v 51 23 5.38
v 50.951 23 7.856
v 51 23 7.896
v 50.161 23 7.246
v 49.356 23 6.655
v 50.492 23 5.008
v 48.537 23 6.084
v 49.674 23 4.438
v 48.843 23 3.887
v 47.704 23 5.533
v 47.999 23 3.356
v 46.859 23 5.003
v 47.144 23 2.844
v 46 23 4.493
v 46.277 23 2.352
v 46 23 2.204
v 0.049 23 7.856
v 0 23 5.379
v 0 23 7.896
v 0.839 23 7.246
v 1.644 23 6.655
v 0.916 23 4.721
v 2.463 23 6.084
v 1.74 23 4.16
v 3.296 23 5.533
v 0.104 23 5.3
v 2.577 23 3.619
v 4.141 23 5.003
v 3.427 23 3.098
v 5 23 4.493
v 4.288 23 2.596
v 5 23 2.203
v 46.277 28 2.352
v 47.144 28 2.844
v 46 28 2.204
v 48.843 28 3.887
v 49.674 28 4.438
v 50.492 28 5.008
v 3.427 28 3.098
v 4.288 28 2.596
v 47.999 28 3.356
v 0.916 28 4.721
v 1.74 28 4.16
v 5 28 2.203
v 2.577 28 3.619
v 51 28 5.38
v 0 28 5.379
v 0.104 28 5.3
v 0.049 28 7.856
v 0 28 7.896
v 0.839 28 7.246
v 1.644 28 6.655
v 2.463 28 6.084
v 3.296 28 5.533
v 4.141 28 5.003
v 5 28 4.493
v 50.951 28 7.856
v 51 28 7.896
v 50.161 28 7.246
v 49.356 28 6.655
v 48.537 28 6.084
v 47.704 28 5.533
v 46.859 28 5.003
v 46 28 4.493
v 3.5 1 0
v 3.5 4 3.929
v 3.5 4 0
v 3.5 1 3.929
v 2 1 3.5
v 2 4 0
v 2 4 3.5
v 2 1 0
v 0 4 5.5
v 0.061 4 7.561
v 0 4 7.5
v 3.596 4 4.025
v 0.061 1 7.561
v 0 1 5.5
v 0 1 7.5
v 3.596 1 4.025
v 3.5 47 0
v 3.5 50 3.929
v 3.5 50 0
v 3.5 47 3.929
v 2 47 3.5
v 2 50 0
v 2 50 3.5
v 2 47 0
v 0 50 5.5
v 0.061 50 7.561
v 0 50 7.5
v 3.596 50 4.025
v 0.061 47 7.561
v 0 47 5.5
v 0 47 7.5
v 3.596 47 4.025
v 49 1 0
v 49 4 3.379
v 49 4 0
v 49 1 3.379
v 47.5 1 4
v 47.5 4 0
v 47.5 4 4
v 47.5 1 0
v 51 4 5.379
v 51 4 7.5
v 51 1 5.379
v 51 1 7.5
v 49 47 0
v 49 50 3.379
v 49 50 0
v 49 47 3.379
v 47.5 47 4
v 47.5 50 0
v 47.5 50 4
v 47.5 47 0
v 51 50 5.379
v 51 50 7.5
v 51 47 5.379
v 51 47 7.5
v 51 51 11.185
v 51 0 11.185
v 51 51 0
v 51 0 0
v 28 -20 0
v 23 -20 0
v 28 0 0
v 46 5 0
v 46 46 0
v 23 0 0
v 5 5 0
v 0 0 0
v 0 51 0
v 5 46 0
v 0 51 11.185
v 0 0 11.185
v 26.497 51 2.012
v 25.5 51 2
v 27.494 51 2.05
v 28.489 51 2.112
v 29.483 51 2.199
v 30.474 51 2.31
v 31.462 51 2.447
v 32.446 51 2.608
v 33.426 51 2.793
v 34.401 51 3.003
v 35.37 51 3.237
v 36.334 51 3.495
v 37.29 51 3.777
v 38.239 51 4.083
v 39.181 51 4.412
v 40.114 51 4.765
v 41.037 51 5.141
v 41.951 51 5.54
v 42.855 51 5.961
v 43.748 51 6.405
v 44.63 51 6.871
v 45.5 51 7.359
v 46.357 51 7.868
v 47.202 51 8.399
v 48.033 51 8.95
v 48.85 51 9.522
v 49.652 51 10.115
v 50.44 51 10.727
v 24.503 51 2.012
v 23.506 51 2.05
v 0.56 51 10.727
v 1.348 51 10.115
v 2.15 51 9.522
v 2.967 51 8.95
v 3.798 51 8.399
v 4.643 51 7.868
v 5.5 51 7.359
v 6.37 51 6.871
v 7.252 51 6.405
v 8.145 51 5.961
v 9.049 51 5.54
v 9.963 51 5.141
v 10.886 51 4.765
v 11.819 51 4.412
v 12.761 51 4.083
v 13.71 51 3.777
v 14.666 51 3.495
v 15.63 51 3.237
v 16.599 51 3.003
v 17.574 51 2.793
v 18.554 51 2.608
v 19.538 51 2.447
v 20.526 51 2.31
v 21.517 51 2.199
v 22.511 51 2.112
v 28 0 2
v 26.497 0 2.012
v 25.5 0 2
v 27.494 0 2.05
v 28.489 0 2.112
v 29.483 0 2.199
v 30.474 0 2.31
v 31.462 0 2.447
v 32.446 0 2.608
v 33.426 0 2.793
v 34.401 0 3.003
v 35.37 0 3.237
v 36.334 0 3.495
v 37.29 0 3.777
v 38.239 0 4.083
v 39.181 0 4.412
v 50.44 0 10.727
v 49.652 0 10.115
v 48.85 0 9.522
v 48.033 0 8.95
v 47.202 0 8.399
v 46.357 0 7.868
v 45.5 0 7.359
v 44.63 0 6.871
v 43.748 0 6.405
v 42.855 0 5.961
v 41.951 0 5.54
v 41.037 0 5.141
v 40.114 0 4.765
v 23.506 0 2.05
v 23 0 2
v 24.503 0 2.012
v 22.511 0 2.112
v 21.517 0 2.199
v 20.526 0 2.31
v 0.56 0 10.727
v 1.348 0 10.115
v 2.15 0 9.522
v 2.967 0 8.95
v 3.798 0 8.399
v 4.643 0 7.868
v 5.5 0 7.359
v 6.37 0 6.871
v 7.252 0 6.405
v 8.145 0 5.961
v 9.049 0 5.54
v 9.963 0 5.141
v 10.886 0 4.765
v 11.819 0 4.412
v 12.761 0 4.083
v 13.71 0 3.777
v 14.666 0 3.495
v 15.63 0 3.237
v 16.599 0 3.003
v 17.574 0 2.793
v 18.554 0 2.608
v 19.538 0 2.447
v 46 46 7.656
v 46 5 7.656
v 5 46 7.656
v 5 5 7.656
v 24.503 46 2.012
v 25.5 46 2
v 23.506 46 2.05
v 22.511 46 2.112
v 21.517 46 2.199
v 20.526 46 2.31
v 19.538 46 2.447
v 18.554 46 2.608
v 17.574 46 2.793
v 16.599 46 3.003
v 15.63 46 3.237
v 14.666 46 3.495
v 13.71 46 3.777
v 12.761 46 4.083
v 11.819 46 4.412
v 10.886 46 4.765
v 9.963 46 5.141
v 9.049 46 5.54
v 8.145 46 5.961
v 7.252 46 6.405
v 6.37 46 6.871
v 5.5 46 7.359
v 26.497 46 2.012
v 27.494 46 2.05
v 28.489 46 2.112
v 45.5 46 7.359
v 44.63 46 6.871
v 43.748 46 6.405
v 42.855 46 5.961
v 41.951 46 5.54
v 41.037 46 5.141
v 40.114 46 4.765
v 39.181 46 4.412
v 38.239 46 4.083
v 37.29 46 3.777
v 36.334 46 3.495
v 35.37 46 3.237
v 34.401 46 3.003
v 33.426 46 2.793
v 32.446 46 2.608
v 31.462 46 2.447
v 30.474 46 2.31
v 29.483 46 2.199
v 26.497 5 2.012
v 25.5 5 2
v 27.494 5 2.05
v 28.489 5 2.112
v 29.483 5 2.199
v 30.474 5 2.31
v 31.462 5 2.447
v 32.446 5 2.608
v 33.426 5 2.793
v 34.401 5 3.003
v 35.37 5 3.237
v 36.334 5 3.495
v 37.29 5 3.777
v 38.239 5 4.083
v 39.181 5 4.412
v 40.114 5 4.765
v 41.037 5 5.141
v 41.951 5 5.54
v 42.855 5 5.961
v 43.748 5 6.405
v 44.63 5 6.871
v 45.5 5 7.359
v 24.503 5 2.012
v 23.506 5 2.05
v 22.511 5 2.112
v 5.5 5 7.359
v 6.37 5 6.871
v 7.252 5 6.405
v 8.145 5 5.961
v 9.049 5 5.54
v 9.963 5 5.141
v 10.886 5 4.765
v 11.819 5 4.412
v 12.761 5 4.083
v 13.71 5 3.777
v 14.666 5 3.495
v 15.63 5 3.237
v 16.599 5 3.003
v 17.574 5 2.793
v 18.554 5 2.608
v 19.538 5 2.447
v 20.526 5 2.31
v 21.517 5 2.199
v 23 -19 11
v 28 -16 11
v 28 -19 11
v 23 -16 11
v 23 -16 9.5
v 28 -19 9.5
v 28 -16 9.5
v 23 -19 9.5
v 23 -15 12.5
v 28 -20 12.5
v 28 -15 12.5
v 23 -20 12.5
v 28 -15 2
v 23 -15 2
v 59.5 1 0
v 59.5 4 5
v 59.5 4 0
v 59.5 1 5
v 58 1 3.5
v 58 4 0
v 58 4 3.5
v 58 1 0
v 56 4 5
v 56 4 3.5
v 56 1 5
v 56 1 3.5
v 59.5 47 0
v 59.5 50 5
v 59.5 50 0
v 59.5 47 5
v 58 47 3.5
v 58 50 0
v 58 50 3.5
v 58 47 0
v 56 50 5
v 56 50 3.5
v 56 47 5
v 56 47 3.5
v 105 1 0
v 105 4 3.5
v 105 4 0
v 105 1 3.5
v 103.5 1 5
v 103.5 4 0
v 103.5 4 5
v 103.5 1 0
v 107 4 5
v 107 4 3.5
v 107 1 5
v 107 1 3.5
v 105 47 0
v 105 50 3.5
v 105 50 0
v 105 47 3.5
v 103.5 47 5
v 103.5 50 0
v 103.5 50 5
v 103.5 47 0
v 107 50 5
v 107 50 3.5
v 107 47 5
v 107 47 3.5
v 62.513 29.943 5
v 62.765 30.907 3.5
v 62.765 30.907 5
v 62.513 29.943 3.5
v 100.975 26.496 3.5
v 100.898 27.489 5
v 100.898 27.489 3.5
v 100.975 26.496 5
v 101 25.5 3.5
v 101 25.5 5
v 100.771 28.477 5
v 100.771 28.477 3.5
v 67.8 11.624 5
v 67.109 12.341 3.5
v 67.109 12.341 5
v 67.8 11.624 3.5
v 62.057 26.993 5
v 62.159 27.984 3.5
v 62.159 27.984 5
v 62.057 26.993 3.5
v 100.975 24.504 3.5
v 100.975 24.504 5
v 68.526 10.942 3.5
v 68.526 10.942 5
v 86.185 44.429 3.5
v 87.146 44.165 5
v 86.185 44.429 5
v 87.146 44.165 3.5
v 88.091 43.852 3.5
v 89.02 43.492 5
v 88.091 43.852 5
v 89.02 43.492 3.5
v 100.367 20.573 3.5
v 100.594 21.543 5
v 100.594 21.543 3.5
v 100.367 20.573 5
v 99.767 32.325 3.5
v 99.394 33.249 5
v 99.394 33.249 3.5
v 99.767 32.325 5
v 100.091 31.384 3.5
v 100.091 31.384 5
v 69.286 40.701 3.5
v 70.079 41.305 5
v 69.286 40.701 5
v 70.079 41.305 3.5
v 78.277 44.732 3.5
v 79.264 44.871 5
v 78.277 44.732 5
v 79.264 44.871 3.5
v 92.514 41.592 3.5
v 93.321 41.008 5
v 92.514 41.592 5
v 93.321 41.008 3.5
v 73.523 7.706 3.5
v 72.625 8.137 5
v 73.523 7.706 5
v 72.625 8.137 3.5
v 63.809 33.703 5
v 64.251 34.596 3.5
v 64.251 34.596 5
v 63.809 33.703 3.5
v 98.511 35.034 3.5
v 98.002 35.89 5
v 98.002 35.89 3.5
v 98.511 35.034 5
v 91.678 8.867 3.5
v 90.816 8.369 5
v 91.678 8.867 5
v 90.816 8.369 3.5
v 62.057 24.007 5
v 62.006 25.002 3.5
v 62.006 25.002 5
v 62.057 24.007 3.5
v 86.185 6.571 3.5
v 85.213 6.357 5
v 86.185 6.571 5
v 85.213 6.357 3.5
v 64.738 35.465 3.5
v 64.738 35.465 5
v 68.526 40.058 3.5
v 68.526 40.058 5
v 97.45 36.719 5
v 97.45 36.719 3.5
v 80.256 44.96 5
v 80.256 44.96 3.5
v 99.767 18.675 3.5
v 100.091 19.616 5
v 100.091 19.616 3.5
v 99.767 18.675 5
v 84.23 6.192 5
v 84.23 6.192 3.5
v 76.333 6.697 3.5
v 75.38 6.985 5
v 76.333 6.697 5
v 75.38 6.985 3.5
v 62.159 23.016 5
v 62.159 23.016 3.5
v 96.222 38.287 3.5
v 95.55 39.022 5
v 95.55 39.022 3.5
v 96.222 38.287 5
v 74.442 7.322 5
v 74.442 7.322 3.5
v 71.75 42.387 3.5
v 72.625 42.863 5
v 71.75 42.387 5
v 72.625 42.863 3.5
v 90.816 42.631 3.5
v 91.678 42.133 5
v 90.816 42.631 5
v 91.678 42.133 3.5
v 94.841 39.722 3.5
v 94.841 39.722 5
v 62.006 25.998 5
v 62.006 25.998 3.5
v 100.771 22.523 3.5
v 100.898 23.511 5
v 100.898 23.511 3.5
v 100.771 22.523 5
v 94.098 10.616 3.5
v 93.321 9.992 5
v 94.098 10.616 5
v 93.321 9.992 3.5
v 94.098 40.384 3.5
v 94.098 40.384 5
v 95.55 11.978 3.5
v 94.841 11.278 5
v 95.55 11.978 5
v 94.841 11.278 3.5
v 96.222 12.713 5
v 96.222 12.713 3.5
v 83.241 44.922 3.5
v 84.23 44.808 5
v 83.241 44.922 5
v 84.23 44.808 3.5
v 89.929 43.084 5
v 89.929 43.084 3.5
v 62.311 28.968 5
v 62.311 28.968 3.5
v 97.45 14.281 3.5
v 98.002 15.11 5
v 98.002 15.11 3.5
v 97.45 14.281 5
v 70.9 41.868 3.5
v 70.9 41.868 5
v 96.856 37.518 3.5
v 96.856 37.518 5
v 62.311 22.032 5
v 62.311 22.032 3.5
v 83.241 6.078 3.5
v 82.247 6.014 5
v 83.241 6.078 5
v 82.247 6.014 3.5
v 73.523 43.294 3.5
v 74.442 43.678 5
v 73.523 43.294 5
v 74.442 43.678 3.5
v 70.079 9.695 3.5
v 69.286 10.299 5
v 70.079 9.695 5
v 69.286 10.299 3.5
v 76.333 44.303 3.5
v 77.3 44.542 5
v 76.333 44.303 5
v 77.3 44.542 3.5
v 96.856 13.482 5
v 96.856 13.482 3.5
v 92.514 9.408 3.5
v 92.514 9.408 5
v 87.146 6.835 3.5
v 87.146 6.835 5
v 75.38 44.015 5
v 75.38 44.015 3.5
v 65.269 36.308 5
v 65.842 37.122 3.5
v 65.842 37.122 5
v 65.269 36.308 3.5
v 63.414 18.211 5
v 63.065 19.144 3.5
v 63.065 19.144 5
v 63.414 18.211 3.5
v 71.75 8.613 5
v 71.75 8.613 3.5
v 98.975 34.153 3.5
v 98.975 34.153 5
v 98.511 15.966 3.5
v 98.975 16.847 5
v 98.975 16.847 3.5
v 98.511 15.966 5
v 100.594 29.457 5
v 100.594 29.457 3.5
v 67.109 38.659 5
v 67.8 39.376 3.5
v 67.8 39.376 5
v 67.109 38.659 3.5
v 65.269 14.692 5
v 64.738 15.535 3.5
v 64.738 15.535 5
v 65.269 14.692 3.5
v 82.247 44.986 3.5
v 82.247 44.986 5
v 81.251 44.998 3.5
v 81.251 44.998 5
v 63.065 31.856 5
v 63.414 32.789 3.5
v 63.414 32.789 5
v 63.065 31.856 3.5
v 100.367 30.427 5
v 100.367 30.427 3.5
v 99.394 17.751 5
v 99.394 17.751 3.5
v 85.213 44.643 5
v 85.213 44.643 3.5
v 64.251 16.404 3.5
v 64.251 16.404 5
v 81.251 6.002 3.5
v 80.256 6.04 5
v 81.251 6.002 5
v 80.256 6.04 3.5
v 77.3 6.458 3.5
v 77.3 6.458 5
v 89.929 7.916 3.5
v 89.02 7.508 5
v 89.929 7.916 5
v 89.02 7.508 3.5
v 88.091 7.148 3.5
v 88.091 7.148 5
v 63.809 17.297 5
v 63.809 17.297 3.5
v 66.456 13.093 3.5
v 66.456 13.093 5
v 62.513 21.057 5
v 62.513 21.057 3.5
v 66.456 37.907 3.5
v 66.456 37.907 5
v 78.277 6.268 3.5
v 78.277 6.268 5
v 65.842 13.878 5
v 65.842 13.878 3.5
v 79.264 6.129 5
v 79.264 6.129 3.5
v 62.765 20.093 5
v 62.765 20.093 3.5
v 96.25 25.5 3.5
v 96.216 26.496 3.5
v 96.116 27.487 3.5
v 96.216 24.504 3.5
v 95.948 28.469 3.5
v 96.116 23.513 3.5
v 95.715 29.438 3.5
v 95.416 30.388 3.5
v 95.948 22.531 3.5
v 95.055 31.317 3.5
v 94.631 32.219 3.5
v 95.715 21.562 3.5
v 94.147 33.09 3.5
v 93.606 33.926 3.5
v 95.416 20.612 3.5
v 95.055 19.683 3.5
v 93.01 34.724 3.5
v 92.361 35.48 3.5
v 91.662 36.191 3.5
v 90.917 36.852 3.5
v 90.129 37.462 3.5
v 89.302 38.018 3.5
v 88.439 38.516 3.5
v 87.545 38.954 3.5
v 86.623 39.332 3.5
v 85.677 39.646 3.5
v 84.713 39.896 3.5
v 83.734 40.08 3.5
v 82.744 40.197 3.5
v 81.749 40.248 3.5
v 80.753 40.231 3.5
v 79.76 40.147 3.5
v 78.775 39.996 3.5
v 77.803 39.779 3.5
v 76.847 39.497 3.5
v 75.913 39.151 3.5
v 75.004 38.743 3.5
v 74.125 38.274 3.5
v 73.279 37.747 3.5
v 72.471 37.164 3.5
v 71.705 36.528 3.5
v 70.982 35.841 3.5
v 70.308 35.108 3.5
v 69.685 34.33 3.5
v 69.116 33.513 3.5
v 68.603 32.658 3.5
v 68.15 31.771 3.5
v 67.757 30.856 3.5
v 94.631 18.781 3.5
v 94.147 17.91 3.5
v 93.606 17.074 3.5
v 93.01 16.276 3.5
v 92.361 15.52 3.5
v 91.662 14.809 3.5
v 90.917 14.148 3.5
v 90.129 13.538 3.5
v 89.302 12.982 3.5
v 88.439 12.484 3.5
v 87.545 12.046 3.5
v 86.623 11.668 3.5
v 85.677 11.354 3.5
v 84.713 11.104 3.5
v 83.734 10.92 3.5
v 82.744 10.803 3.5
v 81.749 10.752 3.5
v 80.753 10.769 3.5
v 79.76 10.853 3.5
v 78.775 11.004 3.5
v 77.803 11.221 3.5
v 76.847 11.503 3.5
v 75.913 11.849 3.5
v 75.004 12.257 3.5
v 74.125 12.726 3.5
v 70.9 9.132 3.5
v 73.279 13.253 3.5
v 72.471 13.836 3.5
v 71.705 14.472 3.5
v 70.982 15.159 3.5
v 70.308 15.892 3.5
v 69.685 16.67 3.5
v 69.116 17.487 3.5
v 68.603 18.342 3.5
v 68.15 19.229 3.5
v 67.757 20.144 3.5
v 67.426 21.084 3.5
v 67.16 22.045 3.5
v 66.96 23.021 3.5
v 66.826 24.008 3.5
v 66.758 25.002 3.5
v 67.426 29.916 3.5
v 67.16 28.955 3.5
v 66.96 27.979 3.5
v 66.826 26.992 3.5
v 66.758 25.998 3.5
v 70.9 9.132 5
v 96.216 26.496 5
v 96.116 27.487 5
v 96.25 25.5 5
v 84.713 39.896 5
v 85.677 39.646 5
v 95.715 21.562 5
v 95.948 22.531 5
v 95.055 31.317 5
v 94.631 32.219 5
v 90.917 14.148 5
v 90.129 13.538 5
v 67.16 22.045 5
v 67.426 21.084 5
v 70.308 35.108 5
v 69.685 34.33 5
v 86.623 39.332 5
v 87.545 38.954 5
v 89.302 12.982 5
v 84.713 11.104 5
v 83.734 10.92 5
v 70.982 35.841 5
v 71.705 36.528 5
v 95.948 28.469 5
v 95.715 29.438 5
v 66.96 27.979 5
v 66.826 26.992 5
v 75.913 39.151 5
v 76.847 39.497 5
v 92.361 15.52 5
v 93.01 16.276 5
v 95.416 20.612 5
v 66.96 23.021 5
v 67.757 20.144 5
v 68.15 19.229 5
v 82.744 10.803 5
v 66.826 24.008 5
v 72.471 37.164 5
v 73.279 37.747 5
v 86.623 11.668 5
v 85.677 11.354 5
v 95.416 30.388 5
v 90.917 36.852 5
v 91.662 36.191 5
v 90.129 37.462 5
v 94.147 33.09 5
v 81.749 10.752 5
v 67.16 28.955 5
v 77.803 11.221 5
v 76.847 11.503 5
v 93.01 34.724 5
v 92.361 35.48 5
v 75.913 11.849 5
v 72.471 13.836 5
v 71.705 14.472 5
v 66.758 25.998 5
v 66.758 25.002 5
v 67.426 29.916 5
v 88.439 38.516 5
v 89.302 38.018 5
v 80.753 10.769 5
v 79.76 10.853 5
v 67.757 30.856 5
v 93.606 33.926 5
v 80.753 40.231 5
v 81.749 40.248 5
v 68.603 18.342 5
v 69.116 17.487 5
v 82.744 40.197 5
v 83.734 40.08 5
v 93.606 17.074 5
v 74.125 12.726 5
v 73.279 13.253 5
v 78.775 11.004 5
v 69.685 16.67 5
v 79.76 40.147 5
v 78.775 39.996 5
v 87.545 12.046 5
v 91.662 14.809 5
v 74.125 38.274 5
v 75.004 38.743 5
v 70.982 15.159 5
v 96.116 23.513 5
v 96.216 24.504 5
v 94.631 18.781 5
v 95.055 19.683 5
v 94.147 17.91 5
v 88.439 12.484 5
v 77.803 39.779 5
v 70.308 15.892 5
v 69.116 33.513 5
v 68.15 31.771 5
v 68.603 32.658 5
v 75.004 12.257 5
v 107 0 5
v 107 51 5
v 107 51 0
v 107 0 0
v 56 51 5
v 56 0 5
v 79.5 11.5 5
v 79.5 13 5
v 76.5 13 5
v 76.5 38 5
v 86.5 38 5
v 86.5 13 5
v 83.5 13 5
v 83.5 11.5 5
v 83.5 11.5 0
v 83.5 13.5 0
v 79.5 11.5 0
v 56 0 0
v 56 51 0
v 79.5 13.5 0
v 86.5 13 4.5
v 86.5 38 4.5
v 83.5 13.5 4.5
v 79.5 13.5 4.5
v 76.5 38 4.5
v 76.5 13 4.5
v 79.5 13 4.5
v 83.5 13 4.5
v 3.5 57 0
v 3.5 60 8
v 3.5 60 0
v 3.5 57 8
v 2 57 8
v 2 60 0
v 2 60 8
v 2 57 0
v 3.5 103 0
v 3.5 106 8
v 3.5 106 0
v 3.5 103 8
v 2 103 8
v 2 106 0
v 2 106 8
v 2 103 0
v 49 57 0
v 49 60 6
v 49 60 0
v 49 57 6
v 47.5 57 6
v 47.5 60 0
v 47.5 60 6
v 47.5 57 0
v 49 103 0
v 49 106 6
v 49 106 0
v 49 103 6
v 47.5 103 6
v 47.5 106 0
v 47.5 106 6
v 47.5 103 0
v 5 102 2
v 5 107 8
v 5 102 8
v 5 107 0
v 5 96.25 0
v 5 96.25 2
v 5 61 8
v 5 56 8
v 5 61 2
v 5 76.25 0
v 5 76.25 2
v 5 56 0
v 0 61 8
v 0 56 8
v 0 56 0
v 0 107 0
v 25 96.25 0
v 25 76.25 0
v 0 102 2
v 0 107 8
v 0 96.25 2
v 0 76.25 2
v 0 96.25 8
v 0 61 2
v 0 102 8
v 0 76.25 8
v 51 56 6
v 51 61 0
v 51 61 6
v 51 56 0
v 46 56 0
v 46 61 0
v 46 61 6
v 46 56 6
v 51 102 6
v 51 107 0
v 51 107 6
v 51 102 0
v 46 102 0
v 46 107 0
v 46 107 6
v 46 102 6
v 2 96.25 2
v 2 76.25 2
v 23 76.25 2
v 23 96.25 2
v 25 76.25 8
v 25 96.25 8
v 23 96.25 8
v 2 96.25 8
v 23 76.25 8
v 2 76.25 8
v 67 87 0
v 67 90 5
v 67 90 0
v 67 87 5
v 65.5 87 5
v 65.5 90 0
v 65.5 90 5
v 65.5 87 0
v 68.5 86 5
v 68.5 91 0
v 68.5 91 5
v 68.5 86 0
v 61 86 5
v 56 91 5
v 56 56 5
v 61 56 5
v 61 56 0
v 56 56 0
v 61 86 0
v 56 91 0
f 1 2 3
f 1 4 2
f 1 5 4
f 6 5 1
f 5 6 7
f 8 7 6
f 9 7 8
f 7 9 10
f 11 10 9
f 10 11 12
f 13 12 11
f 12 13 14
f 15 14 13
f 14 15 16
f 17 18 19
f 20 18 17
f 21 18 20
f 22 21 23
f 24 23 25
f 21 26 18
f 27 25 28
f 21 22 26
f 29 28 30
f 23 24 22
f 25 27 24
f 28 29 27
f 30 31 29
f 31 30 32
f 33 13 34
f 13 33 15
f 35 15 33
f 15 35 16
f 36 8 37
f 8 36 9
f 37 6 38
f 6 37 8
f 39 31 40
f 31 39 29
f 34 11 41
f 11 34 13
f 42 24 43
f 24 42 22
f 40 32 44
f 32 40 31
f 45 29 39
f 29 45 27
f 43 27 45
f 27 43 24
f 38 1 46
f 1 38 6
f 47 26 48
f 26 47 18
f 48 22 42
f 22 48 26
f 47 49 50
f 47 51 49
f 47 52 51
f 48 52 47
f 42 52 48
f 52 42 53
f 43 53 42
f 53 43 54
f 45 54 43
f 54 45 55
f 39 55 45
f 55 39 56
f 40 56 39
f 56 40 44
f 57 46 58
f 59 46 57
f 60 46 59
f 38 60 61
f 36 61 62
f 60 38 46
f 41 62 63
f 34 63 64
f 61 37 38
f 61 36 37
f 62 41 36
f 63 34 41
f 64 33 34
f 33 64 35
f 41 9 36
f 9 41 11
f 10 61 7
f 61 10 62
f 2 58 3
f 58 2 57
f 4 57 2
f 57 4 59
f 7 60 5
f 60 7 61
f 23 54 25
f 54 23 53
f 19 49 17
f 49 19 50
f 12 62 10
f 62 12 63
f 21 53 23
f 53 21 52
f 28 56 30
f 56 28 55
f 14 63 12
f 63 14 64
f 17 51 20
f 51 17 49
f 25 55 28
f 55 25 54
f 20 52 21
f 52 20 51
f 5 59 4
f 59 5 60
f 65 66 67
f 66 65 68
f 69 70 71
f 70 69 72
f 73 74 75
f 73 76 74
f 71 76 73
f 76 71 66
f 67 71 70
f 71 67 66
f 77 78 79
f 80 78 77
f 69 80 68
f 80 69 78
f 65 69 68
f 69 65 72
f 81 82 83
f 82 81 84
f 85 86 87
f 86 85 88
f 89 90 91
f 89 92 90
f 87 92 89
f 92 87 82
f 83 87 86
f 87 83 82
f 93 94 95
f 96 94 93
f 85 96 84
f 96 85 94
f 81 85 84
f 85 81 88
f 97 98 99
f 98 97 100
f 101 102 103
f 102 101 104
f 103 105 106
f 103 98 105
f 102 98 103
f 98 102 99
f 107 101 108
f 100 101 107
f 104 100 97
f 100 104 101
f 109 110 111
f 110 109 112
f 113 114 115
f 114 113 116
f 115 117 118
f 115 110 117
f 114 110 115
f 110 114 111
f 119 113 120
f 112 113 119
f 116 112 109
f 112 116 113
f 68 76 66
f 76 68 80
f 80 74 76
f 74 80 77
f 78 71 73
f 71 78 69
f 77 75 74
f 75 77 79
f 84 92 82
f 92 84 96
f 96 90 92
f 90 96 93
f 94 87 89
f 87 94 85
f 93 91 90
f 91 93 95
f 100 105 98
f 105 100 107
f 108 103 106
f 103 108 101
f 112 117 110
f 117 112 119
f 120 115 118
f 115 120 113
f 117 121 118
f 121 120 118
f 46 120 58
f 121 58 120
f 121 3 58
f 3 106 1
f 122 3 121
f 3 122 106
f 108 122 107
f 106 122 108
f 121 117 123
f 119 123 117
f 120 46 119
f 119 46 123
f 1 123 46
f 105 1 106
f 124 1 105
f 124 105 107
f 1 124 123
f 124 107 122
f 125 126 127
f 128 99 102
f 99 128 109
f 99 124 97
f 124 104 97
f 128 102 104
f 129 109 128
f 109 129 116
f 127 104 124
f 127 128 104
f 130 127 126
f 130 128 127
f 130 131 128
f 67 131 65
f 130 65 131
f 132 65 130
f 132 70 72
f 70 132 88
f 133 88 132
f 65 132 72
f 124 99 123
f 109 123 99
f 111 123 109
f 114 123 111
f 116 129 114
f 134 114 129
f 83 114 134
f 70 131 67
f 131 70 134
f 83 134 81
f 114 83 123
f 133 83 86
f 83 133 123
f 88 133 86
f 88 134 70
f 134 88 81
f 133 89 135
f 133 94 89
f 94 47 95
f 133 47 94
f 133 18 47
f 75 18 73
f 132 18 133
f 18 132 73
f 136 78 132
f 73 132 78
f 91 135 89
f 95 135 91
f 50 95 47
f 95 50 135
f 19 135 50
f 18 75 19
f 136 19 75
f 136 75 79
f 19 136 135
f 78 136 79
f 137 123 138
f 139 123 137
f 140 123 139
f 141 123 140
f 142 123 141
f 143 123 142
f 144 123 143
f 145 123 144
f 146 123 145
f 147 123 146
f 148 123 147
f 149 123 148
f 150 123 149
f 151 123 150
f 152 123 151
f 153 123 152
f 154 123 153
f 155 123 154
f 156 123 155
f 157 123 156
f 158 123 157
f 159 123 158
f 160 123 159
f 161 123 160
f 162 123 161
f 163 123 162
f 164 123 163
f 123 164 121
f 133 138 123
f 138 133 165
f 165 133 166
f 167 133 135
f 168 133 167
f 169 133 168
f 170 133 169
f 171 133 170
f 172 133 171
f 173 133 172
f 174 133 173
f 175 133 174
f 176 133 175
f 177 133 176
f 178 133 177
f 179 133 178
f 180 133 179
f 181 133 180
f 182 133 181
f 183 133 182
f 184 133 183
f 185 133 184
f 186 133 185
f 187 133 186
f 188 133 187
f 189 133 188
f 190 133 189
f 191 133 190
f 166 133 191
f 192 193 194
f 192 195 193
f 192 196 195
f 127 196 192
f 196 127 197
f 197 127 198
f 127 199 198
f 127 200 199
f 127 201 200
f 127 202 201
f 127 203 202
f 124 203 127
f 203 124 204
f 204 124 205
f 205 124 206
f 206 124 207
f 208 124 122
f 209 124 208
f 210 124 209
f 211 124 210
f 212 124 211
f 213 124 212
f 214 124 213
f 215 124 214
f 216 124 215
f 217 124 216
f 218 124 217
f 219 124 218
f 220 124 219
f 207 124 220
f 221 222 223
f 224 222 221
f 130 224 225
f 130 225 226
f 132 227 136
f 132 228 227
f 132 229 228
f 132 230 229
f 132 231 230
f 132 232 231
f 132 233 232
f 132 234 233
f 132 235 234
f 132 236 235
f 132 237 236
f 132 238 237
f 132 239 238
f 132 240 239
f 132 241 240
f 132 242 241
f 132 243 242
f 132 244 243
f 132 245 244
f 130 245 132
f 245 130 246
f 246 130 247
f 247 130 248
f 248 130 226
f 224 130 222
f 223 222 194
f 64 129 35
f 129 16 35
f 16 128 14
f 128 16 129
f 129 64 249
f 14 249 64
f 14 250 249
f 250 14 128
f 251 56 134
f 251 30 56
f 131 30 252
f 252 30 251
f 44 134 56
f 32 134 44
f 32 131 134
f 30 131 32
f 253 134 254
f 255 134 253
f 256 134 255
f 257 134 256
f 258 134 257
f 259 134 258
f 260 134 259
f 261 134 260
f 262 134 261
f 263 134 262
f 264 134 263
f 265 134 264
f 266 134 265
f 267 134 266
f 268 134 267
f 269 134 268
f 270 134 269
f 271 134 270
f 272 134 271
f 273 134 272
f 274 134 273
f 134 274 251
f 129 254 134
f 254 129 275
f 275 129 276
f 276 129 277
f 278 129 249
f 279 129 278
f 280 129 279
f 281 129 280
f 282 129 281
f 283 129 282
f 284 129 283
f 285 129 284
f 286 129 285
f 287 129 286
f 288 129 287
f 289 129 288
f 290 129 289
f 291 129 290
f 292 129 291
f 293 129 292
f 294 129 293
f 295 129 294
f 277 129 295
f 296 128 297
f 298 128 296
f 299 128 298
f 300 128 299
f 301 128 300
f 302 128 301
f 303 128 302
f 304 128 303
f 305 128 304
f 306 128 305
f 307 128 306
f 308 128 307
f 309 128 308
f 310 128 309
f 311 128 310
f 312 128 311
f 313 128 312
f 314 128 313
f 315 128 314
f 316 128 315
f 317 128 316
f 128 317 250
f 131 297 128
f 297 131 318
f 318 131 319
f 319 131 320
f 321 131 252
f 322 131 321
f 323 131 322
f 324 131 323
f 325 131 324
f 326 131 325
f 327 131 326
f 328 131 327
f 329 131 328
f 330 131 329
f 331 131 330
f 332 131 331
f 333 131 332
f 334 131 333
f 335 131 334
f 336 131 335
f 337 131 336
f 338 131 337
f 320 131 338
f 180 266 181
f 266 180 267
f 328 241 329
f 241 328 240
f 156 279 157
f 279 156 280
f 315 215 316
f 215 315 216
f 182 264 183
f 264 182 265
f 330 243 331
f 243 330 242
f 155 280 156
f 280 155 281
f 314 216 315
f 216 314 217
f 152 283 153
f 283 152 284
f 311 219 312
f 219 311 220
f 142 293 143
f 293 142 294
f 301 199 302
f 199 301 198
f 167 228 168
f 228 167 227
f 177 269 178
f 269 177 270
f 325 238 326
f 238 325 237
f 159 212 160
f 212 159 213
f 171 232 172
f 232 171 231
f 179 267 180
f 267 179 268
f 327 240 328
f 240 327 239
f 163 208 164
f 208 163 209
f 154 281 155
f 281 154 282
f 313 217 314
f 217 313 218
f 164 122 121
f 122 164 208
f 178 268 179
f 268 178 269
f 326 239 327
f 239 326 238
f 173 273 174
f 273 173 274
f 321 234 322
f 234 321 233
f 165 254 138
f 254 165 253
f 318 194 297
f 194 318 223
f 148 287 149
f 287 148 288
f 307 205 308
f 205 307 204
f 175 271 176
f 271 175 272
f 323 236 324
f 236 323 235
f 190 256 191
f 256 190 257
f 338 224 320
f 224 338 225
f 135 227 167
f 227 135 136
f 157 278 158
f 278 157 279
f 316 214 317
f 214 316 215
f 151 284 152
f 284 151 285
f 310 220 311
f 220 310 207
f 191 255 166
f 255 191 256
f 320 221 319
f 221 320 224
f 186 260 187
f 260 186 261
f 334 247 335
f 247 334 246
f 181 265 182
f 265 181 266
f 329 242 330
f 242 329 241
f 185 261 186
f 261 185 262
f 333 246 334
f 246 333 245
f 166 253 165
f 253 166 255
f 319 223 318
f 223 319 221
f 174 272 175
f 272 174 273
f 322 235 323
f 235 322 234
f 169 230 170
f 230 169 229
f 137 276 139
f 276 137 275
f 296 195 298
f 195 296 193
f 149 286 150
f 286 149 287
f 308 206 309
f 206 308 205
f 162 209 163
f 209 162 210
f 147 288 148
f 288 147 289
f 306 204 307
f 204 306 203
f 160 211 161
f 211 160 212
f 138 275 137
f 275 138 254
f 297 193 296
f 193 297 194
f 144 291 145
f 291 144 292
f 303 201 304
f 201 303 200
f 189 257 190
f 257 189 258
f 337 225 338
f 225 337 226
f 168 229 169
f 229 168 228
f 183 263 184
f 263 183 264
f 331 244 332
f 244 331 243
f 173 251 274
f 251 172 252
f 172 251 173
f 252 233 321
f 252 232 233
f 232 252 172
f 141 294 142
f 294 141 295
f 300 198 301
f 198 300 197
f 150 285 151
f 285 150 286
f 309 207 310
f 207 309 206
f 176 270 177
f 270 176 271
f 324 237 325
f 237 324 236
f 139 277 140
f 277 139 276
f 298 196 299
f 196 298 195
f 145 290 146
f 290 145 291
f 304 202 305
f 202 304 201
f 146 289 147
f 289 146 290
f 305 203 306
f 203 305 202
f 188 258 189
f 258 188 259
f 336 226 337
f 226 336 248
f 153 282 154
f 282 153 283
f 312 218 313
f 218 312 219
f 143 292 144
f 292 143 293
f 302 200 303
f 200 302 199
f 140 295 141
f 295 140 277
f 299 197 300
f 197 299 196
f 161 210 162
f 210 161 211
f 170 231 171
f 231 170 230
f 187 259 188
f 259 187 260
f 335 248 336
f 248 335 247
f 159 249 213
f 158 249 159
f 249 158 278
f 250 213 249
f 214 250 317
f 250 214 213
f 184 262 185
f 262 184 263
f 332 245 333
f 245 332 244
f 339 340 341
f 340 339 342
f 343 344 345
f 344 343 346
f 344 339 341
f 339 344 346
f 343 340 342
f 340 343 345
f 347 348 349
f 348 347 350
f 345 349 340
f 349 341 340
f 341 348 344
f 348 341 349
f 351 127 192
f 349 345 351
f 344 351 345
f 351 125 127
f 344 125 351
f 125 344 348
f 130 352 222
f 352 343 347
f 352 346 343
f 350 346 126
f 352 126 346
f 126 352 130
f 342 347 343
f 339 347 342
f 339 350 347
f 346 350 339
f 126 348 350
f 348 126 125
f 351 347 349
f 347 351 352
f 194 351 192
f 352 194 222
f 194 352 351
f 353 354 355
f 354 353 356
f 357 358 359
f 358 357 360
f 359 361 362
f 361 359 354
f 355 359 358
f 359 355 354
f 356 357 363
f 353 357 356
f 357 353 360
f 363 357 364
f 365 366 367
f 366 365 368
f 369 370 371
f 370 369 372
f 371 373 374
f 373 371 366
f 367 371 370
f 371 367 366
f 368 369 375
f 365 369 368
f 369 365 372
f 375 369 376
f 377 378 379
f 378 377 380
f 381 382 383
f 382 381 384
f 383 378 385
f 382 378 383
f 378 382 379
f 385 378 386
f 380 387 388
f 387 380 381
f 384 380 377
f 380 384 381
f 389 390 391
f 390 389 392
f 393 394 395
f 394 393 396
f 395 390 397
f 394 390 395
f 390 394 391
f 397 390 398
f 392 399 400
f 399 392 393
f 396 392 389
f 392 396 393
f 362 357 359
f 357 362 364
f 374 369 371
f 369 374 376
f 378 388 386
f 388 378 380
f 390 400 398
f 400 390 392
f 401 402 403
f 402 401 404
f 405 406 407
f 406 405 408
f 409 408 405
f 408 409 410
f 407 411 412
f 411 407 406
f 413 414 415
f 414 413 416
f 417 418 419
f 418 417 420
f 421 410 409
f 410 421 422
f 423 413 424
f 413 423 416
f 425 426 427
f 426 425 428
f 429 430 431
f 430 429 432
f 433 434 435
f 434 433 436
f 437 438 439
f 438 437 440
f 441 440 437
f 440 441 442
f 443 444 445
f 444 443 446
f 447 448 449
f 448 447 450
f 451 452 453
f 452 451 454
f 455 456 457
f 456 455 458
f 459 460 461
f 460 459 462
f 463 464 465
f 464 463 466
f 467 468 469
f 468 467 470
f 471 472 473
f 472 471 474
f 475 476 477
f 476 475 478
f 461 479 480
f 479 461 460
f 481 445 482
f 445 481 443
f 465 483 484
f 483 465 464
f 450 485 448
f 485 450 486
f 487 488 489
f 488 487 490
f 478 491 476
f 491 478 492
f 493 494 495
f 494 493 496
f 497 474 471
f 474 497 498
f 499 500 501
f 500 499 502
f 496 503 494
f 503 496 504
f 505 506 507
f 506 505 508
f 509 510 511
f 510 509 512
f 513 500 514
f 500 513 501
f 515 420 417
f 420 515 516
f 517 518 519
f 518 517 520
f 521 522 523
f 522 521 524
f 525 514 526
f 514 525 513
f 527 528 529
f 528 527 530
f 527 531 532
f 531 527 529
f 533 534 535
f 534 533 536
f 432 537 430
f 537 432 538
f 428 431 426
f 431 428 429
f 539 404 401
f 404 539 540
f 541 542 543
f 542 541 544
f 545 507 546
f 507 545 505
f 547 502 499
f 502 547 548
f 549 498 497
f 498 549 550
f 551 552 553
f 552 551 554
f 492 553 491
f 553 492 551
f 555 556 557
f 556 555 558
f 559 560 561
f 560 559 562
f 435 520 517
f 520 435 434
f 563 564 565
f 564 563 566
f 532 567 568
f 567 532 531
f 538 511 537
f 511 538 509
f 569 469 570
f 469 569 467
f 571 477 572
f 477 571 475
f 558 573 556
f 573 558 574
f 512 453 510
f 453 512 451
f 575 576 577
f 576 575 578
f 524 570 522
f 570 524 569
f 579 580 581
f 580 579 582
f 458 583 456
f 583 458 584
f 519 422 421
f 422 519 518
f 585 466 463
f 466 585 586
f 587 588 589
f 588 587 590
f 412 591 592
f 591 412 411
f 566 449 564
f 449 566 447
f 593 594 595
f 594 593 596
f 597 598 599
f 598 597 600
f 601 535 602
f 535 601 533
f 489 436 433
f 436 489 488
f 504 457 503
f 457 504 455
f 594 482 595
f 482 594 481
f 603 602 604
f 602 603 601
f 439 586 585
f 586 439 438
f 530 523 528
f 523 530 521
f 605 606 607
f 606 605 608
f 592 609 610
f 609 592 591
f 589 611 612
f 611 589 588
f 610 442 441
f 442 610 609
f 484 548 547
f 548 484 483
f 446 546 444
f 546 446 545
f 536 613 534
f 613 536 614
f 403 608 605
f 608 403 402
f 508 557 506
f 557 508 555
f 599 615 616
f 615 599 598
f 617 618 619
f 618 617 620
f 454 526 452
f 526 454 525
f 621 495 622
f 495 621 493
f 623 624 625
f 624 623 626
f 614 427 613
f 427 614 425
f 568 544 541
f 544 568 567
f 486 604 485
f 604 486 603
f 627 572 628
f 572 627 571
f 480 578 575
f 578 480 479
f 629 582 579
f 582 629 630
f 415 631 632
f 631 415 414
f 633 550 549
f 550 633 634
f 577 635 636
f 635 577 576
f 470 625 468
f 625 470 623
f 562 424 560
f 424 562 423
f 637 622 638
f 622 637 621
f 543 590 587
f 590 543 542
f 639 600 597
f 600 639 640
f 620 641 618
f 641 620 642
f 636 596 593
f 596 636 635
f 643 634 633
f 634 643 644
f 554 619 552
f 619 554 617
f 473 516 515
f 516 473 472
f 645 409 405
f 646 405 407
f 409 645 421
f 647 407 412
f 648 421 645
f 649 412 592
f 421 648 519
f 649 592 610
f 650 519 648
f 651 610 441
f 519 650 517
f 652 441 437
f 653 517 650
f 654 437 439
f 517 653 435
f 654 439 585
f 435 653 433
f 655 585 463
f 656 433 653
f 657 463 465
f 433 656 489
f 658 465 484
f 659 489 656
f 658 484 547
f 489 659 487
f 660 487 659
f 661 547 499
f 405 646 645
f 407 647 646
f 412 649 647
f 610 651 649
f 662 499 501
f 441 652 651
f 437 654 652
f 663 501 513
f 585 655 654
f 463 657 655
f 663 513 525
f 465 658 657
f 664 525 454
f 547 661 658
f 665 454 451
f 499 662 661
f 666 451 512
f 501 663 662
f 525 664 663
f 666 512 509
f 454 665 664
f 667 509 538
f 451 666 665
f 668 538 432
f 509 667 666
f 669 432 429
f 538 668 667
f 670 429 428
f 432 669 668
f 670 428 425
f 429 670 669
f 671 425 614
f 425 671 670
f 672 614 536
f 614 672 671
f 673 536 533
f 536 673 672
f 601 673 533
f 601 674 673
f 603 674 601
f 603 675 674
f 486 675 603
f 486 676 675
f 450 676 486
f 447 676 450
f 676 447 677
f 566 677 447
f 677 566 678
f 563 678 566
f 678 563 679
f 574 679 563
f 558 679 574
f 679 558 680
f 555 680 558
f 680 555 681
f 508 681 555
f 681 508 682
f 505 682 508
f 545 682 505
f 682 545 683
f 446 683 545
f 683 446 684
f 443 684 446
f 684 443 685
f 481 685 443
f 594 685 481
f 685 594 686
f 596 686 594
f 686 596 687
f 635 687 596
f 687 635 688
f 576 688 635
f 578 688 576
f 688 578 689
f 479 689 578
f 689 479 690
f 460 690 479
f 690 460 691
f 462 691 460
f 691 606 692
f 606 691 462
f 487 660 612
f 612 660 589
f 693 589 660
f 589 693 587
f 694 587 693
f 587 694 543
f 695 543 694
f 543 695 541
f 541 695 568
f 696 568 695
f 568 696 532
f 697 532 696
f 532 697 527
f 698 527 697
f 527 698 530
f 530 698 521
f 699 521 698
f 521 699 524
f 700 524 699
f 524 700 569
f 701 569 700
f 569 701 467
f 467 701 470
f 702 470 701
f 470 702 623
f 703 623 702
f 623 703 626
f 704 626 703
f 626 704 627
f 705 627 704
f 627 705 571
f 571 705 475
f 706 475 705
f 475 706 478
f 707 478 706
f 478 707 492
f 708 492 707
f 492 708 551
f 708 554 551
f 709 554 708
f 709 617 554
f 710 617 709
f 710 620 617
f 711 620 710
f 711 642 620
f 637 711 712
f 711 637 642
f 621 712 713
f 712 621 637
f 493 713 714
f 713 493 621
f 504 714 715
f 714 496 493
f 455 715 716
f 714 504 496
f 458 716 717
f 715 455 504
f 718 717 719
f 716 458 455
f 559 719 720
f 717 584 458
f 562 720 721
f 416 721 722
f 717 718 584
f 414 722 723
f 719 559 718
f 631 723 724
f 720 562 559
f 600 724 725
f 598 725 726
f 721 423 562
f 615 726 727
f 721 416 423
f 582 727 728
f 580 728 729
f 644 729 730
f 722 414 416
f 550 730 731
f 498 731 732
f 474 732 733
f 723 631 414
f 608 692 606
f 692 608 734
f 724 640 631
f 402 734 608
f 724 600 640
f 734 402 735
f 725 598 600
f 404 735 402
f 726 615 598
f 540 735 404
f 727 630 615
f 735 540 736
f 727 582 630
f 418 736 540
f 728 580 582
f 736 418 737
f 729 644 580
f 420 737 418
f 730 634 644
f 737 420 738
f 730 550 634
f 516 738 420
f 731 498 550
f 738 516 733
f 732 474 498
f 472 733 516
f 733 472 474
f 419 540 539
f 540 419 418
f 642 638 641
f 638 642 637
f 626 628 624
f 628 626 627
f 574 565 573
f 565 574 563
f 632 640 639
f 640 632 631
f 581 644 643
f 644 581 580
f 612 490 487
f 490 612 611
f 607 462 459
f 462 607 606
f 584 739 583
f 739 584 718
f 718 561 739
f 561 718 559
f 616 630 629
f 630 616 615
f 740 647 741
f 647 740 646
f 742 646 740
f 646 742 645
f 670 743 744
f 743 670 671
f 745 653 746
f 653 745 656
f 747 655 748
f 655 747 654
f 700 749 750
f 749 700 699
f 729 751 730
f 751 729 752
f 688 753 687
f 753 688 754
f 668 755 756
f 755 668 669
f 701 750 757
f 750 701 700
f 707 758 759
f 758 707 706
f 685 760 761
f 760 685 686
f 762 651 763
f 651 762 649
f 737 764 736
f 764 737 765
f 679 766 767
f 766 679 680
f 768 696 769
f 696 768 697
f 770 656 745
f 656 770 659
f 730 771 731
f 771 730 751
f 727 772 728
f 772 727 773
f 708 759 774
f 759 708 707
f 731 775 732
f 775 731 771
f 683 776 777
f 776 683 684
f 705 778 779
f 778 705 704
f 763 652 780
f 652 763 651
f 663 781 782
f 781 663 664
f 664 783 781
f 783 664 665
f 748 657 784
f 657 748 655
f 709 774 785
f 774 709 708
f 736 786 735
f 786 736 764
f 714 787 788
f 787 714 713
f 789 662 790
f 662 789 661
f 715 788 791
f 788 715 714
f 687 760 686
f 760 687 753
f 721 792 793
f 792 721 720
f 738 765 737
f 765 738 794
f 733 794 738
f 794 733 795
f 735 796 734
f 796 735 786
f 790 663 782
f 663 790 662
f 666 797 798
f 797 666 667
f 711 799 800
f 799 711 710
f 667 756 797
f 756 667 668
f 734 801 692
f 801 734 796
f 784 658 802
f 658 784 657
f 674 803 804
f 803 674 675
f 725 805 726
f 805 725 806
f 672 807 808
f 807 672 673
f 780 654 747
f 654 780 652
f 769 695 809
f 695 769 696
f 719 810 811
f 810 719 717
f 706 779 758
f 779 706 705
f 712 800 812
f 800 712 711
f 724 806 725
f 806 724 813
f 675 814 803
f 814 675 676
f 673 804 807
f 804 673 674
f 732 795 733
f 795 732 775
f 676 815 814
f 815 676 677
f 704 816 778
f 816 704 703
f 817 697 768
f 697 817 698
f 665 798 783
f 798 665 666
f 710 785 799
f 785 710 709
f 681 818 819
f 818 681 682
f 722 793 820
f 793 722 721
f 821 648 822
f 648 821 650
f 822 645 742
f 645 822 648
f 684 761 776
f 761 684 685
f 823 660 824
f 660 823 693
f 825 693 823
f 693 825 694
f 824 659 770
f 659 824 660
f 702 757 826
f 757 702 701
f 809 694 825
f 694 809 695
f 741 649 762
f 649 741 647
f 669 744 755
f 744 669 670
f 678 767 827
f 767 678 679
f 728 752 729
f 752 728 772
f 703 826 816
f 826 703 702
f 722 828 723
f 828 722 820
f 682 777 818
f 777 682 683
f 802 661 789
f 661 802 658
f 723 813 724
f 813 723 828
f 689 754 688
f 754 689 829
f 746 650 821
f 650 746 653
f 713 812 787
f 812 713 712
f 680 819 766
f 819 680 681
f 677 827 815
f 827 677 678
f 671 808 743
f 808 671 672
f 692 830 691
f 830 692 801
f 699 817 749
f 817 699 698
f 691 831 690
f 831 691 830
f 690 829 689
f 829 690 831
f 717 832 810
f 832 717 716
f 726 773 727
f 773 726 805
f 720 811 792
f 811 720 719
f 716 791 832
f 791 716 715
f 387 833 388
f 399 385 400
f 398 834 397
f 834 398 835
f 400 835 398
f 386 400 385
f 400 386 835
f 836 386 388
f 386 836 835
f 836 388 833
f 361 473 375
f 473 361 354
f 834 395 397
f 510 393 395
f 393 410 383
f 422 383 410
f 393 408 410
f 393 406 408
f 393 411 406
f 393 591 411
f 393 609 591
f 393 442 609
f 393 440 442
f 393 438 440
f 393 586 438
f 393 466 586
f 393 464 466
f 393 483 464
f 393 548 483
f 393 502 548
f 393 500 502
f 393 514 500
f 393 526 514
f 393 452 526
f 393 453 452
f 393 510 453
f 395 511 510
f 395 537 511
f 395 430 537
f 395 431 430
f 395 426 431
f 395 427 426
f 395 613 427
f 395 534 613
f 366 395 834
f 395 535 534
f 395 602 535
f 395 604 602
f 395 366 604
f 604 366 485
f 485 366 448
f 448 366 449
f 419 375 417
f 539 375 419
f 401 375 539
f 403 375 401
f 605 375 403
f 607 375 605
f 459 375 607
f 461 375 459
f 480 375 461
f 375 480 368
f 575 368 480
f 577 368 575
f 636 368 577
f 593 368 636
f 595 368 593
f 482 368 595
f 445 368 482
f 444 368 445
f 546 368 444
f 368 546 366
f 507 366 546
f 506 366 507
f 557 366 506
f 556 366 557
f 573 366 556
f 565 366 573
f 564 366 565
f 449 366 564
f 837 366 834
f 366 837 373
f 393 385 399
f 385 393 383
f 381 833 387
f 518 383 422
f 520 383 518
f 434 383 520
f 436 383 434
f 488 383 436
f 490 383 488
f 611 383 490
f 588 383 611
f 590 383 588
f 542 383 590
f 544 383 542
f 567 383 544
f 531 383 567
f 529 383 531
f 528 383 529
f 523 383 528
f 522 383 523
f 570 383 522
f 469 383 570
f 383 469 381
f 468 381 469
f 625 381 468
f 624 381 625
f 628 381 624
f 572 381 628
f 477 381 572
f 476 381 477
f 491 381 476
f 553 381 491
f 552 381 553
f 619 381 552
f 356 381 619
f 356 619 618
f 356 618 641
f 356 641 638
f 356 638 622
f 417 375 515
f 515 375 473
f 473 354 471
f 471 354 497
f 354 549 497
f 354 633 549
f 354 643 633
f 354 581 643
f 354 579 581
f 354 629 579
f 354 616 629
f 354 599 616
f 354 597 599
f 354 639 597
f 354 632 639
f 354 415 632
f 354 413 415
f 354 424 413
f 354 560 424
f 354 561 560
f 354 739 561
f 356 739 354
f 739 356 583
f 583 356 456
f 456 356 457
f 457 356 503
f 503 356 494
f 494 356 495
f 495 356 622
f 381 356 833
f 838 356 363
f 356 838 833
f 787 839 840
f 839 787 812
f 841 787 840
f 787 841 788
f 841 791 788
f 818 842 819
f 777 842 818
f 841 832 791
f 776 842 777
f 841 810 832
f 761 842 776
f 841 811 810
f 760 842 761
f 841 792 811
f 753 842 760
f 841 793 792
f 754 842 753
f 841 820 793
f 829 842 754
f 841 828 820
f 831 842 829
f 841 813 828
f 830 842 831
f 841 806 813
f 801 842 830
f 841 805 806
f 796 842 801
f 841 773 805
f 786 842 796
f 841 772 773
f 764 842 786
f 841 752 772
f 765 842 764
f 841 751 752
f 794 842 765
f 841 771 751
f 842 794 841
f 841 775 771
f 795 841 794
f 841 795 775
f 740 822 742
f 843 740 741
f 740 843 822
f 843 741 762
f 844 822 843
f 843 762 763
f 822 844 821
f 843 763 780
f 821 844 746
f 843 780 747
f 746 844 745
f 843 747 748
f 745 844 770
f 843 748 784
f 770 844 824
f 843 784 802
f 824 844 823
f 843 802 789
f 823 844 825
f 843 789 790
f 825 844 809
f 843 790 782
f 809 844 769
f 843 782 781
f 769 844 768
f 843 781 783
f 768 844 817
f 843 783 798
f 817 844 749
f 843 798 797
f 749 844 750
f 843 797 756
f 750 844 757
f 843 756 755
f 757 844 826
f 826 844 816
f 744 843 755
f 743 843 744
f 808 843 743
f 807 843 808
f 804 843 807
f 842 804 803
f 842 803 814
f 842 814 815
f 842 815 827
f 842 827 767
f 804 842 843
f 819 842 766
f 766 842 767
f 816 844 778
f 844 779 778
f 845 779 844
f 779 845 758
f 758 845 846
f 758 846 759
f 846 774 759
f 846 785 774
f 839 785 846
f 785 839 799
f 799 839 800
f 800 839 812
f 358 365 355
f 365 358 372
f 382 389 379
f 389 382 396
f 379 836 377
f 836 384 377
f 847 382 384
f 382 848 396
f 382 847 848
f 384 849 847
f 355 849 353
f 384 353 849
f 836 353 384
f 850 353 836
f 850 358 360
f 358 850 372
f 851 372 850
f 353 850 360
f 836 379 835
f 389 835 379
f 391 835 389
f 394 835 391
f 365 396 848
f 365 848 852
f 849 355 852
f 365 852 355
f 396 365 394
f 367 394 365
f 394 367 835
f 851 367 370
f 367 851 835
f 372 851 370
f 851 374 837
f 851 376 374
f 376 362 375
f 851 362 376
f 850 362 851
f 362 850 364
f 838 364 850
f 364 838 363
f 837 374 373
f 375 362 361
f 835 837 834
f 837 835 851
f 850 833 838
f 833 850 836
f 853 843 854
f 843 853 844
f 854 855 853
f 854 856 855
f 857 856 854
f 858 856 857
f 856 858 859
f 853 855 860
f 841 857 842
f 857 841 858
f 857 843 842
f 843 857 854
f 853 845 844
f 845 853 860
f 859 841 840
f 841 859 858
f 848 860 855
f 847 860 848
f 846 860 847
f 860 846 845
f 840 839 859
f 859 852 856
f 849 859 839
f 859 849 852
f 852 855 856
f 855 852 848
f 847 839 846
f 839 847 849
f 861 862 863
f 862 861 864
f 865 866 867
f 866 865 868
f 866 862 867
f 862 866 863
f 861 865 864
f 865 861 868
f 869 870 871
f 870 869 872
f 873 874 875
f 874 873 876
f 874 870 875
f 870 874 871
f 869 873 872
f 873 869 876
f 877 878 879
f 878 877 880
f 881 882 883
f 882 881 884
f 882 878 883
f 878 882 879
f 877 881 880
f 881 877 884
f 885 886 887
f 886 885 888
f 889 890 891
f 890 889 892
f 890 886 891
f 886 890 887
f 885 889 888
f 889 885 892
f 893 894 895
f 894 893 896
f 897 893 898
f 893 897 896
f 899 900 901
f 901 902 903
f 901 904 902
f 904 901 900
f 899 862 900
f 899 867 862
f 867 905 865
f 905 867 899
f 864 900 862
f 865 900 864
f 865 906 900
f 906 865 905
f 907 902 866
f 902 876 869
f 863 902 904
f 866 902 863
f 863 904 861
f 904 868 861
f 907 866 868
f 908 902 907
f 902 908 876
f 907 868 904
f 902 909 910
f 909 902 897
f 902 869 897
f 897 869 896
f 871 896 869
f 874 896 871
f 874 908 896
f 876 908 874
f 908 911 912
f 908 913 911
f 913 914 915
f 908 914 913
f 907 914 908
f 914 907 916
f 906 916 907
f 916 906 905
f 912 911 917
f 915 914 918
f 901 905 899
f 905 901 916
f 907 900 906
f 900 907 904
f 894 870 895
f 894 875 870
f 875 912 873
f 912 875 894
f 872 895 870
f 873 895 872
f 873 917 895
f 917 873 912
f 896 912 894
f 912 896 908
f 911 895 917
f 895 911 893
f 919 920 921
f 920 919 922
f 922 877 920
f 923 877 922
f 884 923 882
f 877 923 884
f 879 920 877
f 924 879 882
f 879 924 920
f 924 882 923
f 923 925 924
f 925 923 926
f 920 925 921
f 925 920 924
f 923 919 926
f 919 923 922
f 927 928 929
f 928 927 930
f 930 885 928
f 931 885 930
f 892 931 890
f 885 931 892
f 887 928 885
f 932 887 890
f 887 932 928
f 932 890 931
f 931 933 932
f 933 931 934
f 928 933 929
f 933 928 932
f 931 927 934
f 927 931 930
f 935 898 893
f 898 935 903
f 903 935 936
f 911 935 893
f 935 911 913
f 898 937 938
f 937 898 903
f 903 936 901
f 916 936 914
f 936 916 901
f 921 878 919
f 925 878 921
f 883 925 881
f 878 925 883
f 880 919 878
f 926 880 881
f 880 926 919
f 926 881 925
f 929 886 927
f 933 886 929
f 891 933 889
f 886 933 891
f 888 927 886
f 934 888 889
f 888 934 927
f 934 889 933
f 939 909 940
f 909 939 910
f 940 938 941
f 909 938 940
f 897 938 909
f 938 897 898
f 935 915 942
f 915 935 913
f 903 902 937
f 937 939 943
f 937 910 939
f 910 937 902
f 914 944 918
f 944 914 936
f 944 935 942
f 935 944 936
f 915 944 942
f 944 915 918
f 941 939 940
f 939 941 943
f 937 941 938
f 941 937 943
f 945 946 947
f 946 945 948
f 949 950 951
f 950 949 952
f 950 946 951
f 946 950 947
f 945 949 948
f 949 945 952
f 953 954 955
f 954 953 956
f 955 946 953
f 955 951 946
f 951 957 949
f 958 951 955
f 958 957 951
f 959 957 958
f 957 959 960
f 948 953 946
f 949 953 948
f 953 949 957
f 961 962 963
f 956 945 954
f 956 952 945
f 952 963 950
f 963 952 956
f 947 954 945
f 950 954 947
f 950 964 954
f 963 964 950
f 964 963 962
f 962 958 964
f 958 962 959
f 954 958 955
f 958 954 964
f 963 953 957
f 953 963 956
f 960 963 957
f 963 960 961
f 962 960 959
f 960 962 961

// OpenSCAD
echo(version=version());

// Values are in millimeters

$fa=1;
$fs=1;
////////////////////////////
// Adjust these for cup
cupDiameter = 80;
wallThickness=5;

mountingNutWidth = 4.5;
mountingNutLength = mountingNutWidth;
mountingNutDepth = 3;

// Big zip-tie that goes around the cup and holds all of this on.
zipTieWidth = 5;
zipTieThick = 2;
zipToCup = 2; // Amount of material between the cup and the zip-tie

coilDiameter = 39;
coilInnerDiameter = 29.5; //32.5;
coilThickness = 2;

coilCircutWidth = 10;
coilCircutLength = 25;
coilCircutDepth = 2;

battMountThick = 2;
battMountLength = 20;

lipoWidth = 21;
lipoLength = 35;
lipoDepth = 6;

featherWidth = 23;
featherLength = 51;
featherDepth = 8; // includes components
featherCircuitDepth = 2;

wireD = 2;
// http://www.csgnetwork.com/screwsochdcaptable.html
mountingScrewD = 3; // Good fit screw is M2.5
mountingScrewLength = wallThickness*3 + featherDepth;

// Want to try replacing the mountingScrew with small zip-ties.
sztWidth = 3; // X
sztThick = 1.5; // Y
sztXinset = 2;
sztYinset = 1;
sztSlotOffset = 1.5;

baseSize = featherLength;

//////////////////////////////////////////////////////////////////////////////
module zip_tie_cutout(depth = featherDepth) {
	for(ox=[sztXinset,baseSize-sztThick-sztXinset]) {
		for(oy=[sztYinset,baseSize-sztWidth-sztYinset]) {
			translate([ox,oy,0]) {
				translate([0,0,-1])
					cube(size=[sztThick,sztWidth,depth+2]);
				//children();
			}
		}
	}
}
module zip_tie_extra_cutout(depth = featherDepth) {
	for(ox=[-sztXinset,baseSize-sztThick-sztXinset]) {
		for(oy=[sztYinset,baseSize-sztWidth-sztYinset]) {
			translate([ox,oy,depth]) {
				children();
			}
		}
	}
}
module zip_tie_extra_cutout2(depth = featherDepth) {
// Lots of magic number here.
	translate([-sztXinset+1, sztYinset, depth + 1.5 + 2.5])
		children();
	translate([-sztXinset+1, baseSize-sztWidth-sztYinset, depth + 1.5 + 2.5])
		children();

	translate([baseSize-sztThick-sztXinset, sztYinset, depth+1.5])
		mirror([0,0,1])
			children();
	translate([baseSize-sztThick-sztXinset, baseSize-sztWidth-sztYinset, depth+1.5])
		mirror([0,0,1])
			children();
}

module screw_cutout() {
	for(ox=[mountingScrewD/2+1,baseSize-(mountingScrewD/2)-1]) {
		for(oy=[mountingScrewD/2+1,baseSize-(mountingScrewD/2)-1]) {
			translate([ox,oy,-1])
				cylinder(h=featherDepth+2, d=mountingScrewD);
		}
	}
}
////////////////////////////
// Lower part
union() {
difference() {
	cube(size=[baseSize,baseSize,15]);

	// cutout center to thin this down. (don't need it solid)
	translate([wallThickness,wallThickness,-1])
		cube(size=[baseSize-(wallThickness*2),baseSize-(wallThickness*2),10]);

	// Cutout the curve of the mug
	translate([baseSize/2, -1, (cupDiameter/2)+2]) // -1 to extend cutout past edges
		rotate([-90,0,0])
			cylinder(h=baseSize+2, d=cupDiameter);

	// Cutout path for zip-tie.
	translate([baseSize/2, (baseSize/2)-(zipTieWidth/2), (cupDiameter/2)])
	rotate([-90,0,0])
		difference() {
			cylinder(h=zipTieWidth, d=cupDiameter+(zipTieThick*2)+zipToCup);
			translate([0,0,-1])
				cylinder(h=zipTieWidth+2, d=cupDiameter+zipToCup);
		}

	// cutout for mounting zip-ties
	zip_tie_cutout(depth=(wallThickness/2)+0.5);
	// side-extention cutouts
	zip_tie_extra_cutout2(depth=wallThickness/2) {
		rotate([0,45,0])
		cube(size=[5,sztWidth,sztThick]);
	}

	// cutout for probe holder
	*translate([baseSize/2, 2.5, (cupDiameter/2)+2])
	rotate([0,-25,0])
		translate([0,0,-(cupDiameter/2)-2.4])
			cube(size=[5.1,10,5.1], center=true);
}
translate([baseSize/2-2.5,0,0])
rotate([0,-90,180])
union() {
		cube(size=[2,15,5]);
		translate([0,15,0])
			difference() {
			cube(size=[15-2.5,5,5]);
			translate([10-2.5,0,0])
				zip_tie_cutout();
		}
}
}

////////////////////////////
// Coil Mount / Top piece

translate([baseSize+5, 0, 0])
difference() {
	cube(size=[baseSize,baseSize,wallThickness]);

	// cutout for mounting zip-ties
	zip_tie_cutout();
	// side-extention cutouts
	zip_tie_extra_cutout(depth=wallThickness-sztSlotOffset) {
		cube(size=[5,sztWidth,sztSlotOffset+1]);
	}

	// Cut out a place for the coil
	translate([baseSize/2,baseSize/2,wallThickness-1.5])
		difference() {
			cylinder(h=coilThickness, d=coilDiameter);
			translate([0,0,-1])
				cylinder(h=coilThickness+2, d=coilInnerDiameter);
		}

	// Cutout place for the coil circut
	translate([baseSize/2-coilCircutWidth/2,baseSize/2-coilCircutLength/2,wallThickness-0.5])
		cube(size=[coilCircutWidth,coilCircutLength,coilCircutDepth]);

	// cutout for wires.
	translate([baseSize/2-wireD, coilCircutLength/2-wireD/2,-1])
		cube(size=[wireD*2,wireD,wallThickness+2]);
}

////////////////////////////
// Middle bit / battery holder and circuit
translate([0,baseSize+5,0])
union() {
	// Rail to mounting screws.
	difference() {
		union() {
			cube(size=[mountingScrewD+2, baseSize, battMountThick]);

			// Standoffs for the screws
			for(ox=[0,baseSize-(mountingScrewD+2)]) {
				for(oy=[0,baseSize-(mountingScrewD+2)]) {
					translate([ox,oy,0])
						cube(size=[mountingScrewD+2, mountingScrewD+2, featherDepth]);
				}
			}
		}
		// cutout for mounting zip-ties
		zip_tie_cutout();

		// cut off tops for holding the circuit board
		translate([baseSize-(mountingScrewD+2)-0.5, -0.5, featherDepth-featherCircuitDepth])
			cube(size=[mountingScrewD+3, baseSize+1, featherCircuitDepth+1]);
	}

	// Show the battery for sighting
	%translate([battMountThick, baseSize/4 - (lipoLength/8), featherDepth-lipoDepth])
		cube(size=[lipoWidth,lipoLength,lipoDepth]);

	// Show the feather circuit board for sighting
	%translate([baseSize-featherWidth,0,0])
		cube(size=[featherWidth,featherLength,featherDepth]);

	// Battery clip
	translate([0,baseSize/4,0])
	union() {
		translate([0,lipoLength/2-(battMountLength/2),0])
			cube(size=[lipoWidth+(battMountThick*2), battMountLength, featherDepth-lipoDepth]);
		translate([0,lipoLength/2-(battMountLength/2), 0])
			cube(size=[2, battMountLength, featherDepth]);
		translate([lipoWidth+battMountThick,lipoLength/2-(battMountLength/2), 0])
			cube(size=[2, battMountLength, featherDepth]);
	}
}

////////////////////////////
// Holder for temperature sensors
translate([baseSize+5,baseSize+5,0])
union() {
		cube(size=[5,30,5]);
		translate([0,30,0])
			difference() {
			cube(size=[15-2.5,5,5]);
			translate([10-2.5,0,0])
				zip_tie_cutout();
		}
}
//	vim: set ai sw=2 ts=2 :
